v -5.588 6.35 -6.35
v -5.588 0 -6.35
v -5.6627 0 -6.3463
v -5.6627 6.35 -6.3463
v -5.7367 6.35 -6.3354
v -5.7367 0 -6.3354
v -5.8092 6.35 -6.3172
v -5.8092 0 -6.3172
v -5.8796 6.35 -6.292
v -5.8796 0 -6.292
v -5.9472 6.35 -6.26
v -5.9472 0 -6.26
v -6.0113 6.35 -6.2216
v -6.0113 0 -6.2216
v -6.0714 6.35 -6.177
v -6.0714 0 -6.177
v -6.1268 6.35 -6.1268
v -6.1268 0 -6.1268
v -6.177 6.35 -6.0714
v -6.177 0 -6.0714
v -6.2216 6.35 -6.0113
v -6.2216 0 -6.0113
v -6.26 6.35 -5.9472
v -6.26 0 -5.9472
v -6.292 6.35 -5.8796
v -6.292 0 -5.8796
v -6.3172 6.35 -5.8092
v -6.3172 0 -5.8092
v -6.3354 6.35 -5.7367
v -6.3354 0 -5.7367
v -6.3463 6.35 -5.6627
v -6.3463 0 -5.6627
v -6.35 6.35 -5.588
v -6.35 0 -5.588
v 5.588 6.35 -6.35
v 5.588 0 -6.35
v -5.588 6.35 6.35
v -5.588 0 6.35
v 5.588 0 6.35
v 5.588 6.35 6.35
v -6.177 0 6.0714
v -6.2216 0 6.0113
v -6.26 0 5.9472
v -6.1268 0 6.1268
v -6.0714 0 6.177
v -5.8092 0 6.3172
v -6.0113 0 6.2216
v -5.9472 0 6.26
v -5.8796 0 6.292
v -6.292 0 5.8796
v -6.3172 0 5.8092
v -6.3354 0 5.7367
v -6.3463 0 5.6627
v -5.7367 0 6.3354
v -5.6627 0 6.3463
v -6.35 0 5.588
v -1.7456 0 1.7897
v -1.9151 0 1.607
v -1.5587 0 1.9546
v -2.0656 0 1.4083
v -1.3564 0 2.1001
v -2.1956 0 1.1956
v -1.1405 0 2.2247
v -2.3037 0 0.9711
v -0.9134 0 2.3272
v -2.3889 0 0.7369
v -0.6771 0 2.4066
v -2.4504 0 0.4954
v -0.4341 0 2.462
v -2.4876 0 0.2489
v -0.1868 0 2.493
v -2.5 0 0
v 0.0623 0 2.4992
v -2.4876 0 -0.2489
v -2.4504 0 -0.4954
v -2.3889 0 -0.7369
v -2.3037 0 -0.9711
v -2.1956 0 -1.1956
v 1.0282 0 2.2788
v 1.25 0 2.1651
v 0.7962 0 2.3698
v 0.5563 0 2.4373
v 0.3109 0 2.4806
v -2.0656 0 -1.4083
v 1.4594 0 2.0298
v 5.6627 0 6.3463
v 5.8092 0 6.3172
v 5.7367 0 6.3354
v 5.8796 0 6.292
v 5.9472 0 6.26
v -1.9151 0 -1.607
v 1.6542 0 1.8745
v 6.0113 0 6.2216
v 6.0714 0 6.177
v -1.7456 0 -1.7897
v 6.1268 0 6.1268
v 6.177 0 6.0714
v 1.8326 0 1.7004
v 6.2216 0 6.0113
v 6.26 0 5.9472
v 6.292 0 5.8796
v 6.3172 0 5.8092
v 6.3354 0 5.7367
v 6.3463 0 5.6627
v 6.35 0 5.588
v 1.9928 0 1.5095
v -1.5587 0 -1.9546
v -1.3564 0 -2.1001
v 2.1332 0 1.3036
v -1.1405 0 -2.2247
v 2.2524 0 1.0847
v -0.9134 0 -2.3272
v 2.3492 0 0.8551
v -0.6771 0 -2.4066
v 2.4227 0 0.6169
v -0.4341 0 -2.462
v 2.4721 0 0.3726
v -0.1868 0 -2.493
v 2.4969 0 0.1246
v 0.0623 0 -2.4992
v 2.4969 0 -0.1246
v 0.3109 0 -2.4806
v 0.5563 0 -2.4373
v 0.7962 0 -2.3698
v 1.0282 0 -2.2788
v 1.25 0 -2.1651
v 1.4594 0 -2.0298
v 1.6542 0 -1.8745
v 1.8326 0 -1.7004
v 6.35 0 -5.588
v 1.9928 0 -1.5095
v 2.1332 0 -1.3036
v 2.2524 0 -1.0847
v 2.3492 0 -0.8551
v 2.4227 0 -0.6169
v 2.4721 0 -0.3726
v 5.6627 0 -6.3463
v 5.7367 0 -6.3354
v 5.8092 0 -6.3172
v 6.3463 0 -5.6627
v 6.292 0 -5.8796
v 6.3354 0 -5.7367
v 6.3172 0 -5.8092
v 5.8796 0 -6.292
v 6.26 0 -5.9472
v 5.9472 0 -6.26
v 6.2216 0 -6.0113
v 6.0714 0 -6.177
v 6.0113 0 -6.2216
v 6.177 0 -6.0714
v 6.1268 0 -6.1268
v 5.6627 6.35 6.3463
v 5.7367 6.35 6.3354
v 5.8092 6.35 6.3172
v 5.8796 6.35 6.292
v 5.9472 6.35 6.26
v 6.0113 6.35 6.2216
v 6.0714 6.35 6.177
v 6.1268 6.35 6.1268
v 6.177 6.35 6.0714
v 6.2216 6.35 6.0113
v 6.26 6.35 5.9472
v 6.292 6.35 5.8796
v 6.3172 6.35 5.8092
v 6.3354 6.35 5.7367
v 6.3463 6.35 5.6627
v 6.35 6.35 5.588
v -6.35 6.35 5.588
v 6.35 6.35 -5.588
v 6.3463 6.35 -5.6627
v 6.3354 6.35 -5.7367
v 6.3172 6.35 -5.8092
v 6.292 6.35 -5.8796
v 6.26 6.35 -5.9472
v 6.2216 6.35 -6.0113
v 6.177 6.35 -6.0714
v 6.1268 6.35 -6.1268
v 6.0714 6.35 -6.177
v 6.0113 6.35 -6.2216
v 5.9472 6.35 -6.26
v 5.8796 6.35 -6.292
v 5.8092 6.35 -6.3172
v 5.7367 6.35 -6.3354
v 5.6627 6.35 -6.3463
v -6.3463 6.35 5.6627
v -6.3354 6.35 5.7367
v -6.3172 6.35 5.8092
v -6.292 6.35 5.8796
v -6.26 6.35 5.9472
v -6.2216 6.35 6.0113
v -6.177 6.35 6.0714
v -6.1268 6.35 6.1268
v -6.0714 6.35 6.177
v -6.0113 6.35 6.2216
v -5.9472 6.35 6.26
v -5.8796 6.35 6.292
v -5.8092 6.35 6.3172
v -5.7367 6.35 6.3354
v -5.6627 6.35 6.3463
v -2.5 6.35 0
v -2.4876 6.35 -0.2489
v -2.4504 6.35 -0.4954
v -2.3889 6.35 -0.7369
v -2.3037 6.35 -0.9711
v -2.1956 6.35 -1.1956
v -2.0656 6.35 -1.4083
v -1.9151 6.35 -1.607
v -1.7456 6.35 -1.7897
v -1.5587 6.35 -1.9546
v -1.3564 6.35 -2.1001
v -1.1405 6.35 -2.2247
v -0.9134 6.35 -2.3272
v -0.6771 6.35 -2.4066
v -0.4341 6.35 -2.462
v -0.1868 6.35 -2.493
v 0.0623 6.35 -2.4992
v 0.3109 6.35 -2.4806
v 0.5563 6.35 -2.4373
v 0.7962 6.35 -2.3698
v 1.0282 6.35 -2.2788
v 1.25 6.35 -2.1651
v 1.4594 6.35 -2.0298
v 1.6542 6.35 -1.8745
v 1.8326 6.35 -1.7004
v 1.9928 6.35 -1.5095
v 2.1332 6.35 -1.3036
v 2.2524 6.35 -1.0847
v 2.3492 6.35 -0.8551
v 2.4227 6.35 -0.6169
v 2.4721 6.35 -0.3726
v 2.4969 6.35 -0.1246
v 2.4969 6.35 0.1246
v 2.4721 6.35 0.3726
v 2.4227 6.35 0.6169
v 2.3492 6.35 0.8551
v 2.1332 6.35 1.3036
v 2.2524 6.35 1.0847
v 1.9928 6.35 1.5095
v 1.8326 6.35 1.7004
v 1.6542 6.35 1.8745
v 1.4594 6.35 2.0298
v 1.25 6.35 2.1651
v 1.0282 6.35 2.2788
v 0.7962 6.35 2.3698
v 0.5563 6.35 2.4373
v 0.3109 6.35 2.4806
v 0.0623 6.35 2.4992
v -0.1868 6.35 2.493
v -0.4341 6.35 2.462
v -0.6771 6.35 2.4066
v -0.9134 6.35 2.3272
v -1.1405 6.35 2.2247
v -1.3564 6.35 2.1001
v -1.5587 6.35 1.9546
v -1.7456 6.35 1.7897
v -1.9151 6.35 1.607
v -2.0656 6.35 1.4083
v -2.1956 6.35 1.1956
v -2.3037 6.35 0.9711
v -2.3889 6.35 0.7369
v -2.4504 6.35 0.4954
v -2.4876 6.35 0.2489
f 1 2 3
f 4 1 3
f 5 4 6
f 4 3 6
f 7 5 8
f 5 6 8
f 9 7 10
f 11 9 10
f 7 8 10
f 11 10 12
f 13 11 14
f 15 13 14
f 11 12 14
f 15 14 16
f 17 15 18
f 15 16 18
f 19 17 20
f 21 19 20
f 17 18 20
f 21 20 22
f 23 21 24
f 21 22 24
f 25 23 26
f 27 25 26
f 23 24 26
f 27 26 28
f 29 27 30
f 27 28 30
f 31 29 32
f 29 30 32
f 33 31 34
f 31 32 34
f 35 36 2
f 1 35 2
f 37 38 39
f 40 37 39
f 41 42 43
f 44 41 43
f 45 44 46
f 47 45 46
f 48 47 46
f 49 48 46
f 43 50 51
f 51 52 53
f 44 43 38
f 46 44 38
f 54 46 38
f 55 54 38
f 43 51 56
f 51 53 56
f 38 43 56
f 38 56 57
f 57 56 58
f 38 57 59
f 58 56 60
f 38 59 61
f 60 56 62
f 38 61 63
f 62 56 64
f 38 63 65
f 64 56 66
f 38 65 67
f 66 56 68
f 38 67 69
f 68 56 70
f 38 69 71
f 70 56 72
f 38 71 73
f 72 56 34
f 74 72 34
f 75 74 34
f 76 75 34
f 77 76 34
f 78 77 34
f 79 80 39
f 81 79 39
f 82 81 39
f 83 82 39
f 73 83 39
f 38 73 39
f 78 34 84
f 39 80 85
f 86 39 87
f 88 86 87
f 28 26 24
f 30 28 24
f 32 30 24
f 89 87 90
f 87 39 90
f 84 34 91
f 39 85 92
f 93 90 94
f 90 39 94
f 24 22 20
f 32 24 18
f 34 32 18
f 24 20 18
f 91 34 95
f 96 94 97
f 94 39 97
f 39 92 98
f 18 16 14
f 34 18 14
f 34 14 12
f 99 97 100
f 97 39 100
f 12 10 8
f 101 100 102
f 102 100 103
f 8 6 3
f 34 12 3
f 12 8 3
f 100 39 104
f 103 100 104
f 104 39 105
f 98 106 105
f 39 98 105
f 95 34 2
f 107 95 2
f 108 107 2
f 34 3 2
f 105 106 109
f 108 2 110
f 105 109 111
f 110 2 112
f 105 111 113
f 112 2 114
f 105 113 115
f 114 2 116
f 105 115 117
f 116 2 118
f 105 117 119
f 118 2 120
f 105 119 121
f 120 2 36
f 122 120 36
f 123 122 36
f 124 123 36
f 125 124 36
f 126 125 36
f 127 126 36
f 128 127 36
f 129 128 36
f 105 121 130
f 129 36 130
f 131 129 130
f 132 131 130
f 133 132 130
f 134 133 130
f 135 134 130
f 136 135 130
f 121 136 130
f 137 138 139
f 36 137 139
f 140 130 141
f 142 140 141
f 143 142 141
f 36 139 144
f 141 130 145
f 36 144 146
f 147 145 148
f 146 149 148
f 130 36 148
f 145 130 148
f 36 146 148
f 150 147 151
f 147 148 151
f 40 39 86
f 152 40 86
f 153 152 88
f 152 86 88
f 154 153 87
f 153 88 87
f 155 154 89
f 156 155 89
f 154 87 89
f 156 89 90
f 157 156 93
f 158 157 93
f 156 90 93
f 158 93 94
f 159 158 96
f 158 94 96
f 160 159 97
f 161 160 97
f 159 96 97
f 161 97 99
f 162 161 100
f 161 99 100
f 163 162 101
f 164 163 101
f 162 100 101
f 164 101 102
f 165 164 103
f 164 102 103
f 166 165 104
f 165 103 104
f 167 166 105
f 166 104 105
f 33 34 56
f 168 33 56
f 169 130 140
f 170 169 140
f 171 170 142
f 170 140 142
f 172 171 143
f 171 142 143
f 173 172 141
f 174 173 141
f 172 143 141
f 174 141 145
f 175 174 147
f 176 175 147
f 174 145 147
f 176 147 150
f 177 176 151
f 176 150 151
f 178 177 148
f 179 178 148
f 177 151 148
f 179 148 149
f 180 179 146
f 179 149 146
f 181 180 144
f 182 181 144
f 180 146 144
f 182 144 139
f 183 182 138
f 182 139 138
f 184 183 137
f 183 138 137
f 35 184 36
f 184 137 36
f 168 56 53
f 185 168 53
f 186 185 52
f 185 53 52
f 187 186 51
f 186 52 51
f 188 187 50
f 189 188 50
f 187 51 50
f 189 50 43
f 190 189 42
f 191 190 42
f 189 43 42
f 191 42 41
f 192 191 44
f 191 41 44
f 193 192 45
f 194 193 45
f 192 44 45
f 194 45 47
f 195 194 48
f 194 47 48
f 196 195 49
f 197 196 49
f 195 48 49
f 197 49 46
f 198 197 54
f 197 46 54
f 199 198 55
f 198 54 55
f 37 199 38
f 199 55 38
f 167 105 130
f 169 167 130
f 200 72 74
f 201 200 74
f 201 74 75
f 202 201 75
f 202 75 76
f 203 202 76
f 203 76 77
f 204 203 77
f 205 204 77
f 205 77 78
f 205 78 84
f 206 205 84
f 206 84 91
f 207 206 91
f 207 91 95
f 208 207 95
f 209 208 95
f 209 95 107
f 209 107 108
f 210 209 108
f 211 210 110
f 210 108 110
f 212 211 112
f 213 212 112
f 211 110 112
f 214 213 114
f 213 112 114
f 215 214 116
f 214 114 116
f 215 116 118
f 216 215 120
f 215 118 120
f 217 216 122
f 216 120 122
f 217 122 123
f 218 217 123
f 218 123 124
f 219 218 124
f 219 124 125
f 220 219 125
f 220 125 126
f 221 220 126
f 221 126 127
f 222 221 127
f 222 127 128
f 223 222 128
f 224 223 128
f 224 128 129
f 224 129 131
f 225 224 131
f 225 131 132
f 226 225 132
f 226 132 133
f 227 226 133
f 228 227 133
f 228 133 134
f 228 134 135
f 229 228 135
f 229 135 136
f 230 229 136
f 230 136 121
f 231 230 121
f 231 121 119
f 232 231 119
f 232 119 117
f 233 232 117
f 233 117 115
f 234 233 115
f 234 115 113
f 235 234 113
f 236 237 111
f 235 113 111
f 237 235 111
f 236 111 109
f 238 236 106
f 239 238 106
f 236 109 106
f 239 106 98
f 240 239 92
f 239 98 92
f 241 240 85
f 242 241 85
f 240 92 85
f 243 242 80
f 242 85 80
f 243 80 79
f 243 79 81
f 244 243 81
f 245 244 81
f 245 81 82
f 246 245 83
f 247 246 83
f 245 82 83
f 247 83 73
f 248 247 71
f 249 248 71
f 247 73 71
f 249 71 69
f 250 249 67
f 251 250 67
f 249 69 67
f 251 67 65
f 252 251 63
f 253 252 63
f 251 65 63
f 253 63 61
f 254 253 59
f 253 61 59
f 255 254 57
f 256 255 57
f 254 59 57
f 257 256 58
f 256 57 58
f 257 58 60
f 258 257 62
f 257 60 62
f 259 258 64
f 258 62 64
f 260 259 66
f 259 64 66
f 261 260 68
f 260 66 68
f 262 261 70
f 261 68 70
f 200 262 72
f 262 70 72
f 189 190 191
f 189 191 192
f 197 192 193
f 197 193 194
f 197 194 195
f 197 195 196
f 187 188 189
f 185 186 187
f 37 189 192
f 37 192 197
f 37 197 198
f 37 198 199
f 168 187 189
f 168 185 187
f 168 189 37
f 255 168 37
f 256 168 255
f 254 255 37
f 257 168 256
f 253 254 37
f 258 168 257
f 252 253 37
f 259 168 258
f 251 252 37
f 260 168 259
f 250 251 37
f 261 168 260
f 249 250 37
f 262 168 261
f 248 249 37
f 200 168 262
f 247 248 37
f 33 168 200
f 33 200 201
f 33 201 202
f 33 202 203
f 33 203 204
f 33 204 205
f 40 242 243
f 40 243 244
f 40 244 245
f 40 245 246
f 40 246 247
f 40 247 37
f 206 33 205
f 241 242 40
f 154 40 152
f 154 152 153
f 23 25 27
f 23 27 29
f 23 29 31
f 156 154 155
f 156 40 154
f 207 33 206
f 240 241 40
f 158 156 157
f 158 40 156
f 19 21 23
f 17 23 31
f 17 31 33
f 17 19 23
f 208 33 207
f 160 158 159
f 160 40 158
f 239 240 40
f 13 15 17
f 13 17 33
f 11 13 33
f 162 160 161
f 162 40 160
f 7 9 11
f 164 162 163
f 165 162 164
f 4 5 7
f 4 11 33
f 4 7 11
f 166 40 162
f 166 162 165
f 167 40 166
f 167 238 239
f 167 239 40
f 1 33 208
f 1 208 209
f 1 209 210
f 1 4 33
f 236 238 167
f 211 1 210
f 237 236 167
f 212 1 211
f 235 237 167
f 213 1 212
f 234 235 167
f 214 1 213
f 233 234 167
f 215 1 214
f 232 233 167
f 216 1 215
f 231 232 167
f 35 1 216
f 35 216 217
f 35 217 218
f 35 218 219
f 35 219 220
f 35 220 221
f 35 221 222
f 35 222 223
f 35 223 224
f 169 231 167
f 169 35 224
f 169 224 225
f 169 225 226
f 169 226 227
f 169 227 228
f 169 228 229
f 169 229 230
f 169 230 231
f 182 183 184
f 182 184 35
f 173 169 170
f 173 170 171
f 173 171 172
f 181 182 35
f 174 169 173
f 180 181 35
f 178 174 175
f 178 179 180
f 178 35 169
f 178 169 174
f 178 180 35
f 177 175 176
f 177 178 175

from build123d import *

# Parameters (mm, degrees)
BOSS_EXTRUDE1_DEPTH   = 6.35
M6X1_0_TAPPED_HOLE1_D = 5


with BuildPart() as part:
    # Sketch1 → Boss-Extrude1 (new body)
    with BuildSketch(Plane(origin=(0, 0, 0), x_dir=(1, 0, 0), z_dir=(0, 1, 0))):
        with BuildLine():
            Line((-5.588, -6.35), (5.588, -6.35))
            ThreePointArc((5.588, -6.35), (6.126815367, -6.126815367), (6.35, -5.588))
            Line((6.35, -5.588), (6.35, 5.588))
            ThreePointArc((6.35, 5.588), (6.126815367, 6.126815367), (5.588, 6.35))
            Line((5.588, 6.35), (-5.588, 6.35))
            ThreePointArc((-5.588, 6.35), (-6.126815367, 6.126815367), (-6.35, 5.588))
            Line((-6.35, 5.588), (-6.35, -5.588))
            ThreePointArc((-6.35, -5.588), (-6.126815367, -6.126815367), (-5.588, -6.35))
        make_face()
    extrude(amount=BOSS_EXTRUDE1_DEPTH)

    # M6x1.0 Tapped Hole1 (through all)
    with Locations(Plane(origin=(0, 6.35, 0), x_dir=(1, 0, 0), z_dir=(0, 1, 0))):
        with Locations((0, 0)):
            Hole(M6X1_0_TAPPED_HOLE1_D / 2)


solid = part.part
